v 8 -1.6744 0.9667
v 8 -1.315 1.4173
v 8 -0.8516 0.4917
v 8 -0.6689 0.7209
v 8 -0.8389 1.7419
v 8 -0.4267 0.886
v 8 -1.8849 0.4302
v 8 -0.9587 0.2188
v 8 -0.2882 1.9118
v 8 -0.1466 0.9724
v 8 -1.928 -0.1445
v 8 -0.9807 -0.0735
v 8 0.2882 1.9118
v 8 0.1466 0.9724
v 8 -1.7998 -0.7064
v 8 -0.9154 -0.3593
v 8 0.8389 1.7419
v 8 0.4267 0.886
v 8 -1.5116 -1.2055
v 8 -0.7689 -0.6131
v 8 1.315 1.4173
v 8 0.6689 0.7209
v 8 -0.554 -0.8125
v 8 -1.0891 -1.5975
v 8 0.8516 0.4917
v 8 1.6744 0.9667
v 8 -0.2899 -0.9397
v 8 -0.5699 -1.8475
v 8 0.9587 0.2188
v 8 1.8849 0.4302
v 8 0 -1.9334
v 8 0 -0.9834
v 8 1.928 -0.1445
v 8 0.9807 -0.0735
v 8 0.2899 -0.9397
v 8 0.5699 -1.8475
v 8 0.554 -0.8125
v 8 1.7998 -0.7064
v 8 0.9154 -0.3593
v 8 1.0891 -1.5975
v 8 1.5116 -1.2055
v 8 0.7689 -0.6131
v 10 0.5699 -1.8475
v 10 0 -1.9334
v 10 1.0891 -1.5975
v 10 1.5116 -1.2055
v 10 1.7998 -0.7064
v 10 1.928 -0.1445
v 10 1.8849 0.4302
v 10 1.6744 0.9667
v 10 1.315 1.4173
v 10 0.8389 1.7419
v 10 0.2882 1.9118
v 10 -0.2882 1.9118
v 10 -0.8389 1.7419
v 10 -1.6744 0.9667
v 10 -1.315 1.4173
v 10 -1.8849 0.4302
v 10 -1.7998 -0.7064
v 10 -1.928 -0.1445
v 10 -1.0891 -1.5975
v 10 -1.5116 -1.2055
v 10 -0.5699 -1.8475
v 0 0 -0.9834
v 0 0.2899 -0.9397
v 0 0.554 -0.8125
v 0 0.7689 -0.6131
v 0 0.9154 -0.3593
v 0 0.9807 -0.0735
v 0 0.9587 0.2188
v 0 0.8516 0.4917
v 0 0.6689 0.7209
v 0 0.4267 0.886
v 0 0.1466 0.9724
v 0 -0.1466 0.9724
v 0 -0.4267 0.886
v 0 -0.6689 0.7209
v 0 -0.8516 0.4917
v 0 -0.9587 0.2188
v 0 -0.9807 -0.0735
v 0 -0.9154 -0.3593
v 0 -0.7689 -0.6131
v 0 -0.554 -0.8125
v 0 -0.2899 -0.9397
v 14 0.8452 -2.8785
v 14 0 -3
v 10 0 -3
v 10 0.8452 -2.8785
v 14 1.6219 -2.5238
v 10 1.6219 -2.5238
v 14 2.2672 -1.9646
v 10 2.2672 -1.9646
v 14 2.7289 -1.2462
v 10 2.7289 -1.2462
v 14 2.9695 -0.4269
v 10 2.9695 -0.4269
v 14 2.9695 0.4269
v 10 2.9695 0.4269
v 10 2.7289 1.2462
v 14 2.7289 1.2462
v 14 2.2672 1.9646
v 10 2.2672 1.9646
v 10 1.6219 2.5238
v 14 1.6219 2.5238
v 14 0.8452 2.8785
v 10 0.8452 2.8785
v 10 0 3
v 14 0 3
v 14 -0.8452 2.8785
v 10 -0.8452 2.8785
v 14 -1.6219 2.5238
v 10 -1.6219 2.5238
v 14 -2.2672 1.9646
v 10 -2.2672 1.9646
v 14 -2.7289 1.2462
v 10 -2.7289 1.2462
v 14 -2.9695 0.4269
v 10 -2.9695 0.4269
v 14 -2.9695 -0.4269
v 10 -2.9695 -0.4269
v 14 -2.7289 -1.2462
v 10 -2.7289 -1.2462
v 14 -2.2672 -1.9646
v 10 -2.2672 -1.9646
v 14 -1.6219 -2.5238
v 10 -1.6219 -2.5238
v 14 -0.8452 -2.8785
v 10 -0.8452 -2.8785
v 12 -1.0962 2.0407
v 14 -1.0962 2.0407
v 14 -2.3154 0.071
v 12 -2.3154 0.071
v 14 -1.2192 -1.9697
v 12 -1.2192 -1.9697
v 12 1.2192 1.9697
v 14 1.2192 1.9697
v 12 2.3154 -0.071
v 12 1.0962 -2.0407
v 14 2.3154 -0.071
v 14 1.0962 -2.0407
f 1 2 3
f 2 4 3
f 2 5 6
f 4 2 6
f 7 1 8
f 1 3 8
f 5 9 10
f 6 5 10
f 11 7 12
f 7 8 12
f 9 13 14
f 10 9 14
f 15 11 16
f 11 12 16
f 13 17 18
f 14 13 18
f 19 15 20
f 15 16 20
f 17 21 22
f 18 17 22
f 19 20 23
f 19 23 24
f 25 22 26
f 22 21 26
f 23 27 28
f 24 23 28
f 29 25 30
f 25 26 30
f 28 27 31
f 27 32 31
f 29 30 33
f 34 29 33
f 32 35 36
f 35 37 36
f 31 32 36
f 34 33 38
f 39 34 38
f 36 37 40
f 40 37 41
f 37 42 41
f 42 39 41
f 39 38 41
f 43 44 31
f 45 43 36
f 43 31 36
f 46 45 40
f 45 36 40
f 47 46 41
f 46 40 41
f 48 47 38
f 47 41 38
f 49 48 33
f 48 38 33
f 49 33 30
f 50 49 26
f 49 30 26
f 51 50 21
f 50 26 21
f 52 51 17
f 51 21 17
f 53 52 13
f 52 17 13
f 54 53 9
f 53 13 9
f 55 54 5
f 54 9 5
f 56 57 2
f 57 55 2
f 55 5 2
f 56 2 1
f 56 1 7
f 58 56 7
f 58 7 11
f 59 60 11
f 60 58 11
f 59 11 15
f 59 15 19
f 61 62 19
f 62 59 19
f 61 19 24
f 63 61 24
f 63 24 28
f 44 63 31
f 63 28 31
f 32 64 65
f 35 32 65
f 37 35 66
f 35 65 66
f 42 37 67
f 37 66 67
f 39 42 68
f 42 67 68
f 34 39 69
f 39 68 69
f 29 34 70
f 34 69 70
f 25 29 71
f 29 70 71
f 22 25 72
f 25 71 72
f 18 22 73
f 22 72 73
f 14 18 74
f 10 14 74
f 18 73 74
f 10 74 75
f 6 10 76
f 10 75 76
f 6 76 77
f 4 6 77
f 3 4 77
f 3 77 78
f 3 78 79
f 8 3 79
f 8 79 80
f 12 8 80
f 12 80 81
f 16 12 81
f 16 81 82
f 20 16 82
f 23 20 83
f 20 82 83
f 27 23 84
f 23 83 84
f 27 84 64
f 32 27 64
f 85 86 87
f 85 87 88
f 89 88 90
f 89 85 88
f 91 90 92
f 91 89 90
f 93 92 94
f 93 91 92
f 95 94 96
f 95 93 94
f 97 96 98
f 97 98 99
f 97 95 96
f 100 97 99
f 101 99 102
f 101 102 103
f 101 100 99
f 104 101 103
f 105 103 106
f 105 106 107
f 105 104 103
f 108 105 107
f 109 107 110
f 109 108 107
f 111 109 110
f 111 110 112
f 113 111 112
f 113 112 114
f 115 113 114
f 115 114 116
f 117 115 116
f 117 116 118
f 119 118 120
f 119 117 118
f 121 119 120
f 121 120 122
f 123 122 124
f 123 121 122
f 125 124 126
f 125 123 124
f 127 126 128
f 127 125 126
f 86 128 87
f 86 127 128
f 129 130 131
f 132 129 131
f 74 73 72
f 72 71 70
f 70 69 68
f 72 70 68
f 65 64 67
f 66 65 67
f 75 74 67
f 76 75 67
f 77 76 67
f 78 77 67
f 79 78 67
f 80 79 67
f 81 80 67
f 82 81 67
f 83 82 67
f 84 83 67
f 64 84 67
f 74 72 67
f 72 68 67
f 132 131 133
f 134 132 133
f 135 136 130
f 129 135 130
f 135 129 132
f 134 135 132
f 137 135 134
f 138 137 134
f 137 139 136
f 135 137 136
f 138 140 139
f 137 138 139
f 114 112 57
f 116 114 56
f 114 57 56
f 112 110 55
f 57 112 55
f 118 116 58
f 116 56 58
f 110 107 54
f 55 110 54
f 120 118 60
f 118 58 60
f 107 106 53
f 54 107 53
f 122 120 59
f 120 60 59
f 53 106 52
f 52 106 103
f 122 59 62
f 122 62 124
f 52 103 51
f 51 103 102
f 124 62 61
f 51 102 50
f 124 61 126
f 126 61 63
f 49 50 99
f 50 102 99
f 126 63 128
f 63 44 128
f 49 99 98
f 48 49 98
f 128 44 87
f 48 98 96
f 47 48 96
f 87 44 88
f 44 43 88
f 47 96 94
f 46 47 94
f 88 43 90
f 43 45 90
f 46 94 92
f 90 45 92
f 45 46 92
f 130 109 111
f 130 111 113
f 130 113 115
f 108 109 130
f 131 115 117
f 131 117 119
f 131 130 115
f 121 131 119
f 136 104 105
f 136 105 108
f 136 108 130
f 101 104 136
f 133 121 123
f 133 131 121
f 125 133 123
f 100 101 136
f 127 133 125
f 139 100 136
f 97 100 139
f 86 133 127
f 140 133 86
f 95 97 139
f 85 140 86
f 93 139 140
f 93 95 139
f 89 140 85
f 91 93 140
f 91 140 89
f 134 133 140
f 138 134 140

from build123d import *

# Parameters (mm, degrees)
SKETCH1_R           = 0.9834
BOSS_EXTRUDE1_DEPTH = 8
SKETCH2_R           = 1.9334
BOSS_EXTRUDE2_DEPTH = 6
SKETCH3_R           = 3
BOSS_EXTRUDE3_DEPTH = 4
CUT_EXTRUDE1_DEPTH  = 2


with BuildPart() as part:
    # Sketch1 → Boss-Extrude1 (new body)
    with BuildSketch(Plane(origin=(0, 0, 0), x_dir=(0, 0, -1), z_dir=(1, 0, 0))):
        Circle(SKETCH1_R)
    extrude(amount=BOSS_EXTRUDE1_DEPTH)

    # Sketch2 → Boss-Extrude2 (add)
    with BuildSketch(Plane(origin=(8, 0, 0), x_dir=(0, 0, -1), z_dir=(1, 0, 0))):
        Circle(SKETCH2_R)
    extrude(amount=BOSS_EXTRUDE2_DEPTH)

    # Sketch3 → Boss-Extrude3 (add)
    with BuildSketch(Plane(origin=(14, 0, 0), x_dir=(0, 0, -1), z_dir=(1, 0, 0))):
        Circle(SKETCH3_R)
    extrude(amount=-BOSS_EXTRUDE3_DEPTH)

    # Sketch7 → Cut-Extrude1 (cut)
    with BuildSketch(Plane(origin=(14, 0, 0), x_dir=(0, 0, -1), z_dir=(1, 0, 0))):
        Polygon((2.040680279, 1.096176231), (0.071023676, 2.315369078), (-1.969656602, 1.219192847), (-2.040680279, -1.096176231), (-0.071023676, -2.315369078), (1.969656602, -1.219192847), align=None)
    extrude(amount=-CUT_EXTRUDE1_DEPTH, mode=Mode.SUBTRACT)


solid = part.part
